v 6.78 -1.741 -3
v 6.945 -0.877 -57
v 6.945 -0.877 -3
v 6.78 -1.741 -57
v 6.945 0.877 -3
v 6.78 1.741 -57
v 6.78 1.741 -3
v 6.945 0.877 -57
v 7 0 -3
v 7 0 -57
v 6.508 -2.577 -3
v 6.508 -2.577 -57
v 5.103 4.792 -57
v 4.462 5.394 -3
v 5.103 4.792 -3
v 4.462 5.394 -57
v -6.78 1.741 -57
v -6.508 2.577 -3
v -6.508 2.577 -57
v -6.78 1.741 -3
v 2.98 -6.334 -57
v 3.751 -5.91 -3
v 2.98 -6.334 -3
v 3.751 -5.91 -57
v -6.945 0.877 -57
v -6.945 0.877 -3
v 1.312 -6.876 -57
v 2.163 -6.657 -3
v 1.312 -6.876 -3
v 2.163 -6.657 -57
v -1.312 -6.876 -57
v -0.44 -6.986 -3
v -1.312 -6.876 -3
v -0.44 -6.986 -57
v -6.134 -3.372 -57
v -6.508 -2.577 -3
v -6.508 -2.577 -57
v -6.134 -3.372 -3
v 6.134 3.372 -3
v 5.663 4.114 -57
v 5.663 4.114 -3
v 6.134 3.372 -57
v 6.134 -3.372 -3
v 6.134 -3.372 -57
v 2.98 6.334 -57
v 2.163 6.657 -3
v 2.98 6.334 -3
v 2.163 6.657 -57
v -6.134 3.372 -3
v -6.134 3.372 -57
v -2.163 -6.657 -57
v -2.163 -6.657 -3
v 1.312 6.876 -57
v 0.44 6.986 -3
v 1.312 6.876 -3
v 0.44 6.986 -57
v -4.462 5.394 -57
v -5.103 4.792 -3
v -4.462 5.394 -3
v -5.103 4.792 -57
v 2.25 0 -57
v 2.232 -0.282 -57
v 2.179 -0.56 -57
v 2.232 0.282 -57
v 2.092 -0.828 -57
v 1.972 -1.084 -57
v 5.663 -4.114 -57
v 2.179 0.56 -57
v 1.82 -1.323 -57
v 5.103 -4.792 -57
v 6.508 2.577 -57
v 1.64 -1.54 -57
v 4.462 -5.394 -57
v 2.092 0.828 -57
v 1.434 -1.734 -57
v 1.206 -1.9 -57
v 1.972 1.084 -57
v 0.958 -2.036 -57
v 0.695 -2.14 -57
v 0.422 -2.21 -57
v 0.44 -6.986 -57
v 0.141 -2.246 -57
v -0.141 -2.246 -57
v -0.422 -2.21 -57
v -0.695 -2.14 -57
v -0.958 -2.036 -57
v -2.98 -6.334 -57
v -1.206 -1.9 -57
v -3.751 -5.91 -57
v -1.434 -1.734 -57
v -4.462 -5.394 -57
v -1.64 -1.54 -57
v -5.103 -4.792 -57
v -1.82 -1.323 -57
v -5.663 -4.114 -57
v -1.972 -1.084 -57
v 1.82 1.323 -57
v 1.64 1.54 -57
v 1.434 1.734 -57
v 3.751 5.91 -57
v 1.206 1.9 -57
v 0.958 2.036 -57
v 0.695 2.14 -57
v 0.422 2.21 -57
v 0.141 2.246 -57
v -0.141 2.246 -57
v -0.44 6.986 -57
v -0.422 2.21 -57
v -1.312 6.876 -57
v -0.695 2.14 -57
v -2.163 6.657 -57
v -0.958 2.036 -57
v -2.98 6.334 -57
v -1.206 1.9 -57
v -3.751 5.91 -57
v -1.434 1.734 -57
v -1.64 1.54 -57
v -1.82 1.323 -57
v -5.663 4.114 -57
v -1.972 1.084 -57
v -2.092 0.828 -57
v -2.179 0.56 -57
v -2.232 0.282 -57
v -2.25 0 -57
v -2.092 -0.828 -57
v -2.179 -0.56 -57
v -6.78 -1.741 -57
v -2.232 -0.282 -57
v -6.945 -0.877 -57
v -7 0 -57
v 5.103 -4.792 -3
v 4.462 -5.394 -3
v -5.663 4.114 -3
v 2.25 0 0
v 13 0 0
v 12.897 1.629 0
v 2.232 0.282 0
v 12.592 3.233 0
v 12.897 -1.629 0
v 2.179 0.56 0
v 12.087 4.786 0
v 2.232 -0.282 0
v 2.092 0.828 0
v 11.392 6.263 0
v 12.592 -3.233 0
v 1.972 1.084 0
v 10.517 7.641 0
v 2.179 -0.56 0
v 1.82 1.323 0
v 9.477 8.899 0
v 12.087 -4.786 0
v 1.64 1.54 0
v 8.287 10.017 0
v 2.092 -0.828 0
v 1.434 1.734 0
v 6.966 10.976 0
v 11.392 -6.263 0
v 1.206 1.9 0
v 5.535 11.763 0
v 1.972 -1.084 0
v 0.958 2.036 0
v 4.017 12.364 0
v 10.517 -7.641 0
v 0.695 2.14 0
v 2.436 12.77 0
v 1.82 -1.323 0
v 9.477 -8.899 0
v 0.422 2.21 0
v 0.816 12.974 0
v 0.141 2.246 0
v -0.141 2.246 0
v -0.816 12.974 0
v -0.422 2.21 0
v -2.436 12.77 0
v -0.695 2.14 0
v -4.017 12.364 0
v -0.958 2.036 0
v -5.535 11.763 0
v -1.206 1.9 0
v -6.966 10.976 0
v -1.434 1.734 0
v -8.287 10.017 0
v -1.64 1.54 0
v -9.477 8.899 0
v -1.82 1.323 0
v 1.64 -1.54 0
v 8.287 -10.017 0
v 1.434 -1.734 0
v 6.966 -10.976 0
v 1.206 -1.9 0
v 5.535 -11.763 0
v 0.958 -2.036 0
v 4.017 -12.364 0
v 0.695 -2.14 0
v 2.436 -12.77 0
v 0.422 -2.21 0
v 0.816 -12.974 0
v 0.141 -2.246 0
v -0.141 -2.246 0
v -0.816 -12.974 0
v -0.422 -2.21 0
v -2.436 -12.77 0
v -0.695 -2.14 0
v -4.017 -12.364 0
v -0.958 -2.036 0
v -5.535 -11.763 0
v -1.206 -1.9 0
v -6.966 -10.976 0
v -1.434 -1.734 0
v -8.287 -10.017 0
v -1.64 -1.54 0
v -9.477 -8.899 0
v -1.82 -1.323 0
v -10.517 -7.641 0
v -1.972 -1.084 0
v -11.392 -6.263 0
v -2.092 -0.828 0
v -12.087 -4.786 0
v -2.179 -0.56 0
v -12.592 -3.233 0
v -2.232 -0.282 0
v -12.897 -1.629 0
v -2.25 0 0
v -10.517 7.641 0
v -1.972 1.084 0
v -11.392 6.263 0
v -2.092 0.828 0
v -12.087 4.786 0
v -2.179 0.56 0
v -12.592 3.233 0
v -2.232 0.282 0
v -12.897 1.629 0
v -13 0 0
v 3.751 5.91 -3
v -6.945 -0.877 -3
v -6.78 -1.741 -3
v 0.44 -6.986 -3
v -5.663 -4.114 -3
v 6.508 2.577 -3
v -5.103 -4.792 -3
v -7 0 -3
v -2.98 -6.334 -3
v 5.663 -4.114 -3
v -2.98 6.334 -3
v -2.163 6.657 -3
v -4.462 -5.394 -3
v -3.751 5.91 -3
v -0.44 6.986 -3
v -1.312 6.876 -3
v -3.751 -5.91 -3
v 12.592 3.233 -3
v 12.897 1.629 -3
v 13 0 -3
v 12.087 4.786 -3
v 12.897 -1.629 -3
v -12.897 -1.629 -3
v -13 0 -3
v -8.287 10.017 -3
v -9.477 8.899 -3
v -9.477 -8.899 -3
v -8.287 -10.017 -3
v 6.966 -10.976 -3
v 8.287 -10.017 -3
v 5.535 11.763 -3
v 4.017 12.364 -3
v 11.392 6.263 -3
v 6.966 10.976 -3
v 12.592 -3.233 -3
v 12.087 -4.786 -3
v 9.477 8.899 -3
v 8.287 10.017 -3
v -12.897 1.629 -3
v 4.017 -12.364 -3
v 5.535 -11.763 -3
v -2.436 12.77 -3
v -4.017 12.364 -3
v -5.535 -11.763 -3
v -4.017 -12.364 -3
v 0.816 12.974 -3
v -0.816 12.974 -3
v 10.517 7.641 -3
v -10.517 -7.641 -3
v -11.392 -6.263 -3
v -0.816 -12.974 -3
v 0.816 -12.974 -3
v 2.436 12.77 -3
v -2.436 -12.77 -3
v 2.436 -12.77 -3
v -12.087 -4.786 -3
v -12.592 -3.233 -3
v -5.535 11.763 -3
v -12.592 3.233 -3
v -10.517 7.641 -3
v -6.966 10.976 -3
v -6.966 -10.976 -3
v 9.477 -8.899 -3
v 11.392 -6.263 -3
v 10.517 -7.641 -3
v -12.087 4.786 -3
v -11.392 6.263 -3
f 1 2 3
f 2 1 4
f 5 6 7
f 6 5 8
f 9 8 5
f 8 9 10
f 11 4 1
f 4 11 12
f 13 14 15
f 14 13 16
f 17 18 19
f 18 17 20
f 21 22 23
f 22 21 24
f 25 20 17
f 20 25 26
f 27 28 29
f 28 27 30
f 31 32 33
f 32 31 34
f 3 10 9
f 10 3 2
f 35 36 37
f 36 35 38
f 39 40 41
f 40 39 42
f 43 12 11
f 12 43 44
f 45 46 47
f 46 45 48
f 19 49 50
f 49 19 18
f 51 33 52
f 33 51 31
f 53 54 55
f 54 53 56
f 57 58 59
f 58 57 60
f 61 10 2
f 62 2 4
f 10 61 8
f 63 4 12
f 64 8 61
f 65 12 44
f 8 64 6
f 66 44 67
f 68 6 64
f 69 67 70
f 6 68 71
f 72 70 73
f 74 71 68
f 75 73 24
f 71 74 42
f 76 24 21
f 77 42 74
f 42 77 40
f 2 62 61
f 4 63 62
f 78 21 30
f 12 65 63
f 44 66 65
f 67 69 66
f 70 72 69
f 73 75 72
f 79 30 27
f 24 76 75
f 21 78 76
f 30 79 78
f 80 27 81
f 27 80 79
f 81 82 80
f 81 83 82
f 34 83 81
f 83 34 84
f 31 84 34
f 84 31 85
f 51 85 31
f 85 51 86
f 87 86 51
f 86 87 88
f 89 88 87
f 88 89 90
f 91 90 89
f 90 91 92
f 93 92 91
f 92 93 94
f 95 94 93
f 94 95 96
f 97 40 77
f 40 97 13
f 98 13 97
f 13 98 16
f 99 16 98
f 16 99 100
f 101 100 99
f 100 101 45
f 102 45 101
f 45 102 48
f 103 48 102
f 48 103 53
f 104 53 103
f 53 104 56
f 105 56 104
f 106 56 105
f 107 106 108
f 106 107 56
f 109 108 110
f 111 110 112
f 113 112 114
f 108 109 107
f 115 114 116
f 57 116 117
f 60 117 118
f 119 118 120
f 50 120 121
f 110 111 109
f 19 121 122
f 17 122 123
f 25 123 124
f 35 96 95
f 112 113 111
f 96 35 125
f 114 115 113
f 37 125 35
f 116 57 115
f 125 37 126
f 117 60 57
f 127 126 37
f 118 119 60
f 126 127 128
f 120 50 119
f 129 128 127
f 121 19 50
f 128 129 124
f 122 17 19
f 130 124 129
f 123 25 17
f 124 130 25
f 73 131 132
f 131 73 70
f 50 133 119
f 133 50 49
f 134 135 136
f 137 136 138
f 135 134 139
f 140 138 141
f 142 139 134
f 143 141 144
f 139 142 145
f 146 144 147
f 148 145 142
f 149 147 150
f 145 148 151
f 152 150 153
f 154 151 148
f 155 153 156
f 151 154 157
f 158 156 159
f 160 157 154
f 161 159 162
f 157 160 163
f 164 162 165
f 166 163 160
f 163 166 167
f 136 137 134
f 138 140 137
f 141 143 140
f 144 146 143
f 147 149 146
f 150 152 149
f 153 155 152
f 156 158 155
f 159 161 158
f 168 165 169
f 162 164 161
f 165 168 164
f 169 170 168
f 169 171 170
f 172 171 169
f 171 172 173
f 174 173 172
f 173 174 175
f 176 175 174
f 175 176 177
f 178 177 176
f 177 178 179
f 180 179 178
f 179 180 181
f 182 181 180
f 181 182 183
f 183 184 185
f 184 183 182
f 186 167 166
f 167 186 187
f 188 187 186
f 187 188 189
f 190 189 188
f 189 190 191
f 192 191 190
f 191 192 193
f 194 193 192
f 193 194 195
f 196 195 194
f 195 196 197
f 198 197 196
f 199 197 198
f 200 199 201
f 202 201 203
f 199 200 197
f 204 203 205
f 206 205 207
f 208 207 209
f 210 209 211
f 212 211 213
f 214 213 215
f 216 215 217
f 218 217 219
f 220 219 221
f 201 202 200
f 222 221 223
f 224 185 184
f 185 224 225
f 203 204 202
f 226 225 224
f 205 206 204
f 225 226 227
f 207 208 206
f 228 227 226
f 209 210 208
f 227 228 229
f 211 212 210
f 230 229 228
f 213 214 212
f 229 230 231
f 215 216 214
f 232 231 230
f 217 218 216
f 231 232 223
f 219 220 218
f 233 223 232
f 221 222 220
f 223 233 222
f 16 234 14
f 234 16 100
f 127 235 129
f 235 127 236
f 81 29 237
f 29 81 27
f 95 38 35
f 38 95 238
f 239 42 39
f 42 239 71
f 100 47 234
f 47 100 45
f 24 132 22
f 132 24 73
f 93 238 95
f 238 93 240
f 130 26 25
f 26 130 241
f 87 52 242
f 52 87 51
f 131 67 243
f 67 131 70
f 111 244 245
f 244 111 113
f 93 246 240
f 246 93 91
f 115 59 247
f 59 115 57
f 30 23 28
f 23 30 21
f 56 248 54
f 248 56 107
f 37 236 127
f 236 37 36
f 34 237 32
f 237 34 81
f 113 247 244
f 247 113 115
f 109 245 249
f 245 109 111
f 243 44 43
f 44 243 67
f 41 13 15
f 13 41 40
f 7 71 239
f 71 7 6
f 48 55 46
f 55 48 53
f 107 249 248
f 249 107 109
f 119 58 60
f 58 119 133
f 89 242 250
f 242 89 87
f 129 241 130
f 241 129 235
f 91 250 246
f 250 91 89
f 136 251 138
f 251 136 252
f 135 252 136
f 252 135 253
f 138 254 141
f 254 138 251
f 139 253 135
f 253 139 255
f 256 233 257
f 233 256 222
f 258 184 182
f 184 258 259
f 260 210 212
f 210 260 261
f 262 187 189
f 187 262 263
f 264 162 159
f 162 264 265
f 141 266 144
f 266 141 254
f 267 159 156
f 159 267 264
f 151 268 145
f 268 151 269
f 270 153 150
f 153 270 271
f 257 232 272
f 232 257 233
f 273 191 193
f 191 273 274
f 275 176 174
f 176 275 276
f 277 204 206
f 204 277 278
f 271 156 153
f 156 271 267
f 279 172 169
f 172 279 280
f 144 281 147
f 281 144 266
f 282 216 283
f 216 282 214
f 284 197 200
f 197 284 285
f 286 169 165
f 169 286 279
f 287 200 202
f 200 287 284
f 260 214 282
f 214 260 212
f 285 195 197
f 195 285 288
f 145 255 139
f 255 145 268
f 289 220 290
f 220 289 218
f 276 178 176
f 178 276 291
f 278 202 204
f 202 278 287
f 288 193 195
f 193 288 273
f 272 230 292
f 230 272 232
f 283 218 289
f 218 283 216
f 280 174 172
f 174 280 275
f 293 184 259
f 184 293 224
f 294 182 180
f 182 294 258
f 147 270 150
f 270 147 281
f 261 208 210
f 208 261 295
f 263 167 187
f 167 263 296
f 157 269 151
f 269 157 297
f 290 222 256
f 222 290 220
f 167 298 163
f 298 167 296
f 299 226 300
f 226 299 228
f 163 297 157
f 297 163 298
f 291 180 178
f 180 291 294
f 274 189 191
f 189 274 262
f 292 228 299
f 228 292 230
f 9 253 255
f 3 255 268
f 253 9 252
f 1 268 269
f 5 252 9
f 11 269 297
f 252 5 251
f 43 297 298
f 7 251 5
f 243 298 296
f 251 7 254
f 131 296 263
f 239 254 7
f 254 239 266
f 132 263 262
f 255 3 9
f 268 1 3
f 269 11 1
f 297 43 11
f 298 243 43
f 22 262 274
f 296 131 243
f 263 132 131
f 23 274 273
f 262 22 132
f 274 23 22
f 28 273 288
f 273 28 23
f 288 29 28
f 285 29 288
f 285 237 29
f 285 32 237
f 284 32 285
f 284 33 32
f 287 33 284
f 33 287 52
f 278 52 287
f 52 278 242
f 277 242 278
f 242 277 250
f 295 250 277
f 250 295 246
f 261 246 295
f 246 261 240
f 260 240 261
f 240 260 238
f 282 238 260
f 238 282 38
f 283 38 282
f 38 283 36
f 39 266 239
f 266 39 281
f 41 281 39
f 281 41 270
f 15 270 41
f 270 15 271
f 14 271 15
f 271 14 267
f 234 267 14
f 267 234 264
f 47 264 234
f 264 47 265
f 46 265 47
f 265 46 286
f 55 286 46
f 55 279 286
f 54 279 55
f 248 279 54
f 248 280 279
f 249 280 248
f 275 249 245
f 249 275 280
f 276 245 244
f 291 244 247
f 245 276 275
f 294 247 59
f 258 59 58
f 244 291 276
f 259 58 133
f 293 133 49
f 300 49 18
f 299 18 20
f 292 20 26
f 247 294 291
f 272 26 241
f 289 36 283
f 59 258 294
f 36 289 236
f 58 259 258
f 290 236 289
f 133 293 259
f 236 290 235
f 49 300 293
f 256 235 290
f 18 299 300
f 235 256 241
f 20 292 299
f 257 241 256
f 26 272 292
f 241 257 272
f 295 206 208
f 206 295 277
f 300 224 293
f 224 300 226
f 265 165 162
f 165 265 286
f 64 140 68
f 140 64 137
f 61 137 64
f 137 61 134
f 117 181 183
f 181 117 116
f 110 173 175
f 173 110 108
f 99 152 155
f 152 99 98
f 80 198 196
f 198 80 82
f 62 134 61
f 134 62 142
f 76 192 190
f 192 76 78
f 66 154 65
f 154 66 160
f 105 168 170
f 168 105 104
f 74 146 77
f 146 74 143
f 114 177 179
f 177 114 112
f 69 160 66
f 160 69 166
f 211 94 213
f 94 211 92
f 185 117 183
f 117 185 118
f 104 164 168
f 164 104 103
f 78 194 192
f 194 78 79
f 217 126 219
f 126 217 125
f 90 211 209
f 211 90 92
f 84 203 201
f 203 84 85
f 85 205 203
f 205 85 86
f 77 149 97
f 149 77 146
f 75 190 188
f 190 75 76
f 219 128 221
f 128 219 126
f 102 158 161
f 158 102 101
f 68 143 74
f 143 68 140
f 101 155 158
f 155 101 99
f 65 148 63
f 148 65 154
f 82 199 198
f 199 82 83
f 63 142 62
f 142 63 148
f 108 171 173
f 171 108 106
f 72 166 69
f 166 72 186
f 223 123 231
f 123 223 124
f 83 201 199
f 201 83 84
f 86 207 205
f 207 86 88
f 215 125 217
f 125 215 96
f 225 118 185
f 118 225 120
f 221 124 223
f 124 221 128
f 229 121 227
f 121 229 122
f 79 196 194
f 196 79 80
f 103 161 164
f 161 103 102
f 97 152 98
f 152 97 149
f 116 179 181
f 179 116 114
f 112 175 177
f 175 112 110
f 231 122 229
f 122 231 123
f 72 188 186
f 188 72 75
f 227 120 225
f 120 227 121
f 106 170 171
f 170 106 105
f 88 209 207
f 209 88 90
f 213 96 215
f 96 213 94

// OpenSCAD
$fn = 50;


difference() {
	union() {
		translate(v = [0, 0, -57.0000000000]) {
			cylinder(h = 57, r = 7.0000000000);
		}
		translate(v = [0, 0, -3.0000000000]) {
			cylinder(h = 3, r = 13.0000000000);
		}
	}
	union() {
		#translate(v = [0, 0, -57]) {
			cylinder(h = 57, r = 2.2500000000);
		}
	}
}
